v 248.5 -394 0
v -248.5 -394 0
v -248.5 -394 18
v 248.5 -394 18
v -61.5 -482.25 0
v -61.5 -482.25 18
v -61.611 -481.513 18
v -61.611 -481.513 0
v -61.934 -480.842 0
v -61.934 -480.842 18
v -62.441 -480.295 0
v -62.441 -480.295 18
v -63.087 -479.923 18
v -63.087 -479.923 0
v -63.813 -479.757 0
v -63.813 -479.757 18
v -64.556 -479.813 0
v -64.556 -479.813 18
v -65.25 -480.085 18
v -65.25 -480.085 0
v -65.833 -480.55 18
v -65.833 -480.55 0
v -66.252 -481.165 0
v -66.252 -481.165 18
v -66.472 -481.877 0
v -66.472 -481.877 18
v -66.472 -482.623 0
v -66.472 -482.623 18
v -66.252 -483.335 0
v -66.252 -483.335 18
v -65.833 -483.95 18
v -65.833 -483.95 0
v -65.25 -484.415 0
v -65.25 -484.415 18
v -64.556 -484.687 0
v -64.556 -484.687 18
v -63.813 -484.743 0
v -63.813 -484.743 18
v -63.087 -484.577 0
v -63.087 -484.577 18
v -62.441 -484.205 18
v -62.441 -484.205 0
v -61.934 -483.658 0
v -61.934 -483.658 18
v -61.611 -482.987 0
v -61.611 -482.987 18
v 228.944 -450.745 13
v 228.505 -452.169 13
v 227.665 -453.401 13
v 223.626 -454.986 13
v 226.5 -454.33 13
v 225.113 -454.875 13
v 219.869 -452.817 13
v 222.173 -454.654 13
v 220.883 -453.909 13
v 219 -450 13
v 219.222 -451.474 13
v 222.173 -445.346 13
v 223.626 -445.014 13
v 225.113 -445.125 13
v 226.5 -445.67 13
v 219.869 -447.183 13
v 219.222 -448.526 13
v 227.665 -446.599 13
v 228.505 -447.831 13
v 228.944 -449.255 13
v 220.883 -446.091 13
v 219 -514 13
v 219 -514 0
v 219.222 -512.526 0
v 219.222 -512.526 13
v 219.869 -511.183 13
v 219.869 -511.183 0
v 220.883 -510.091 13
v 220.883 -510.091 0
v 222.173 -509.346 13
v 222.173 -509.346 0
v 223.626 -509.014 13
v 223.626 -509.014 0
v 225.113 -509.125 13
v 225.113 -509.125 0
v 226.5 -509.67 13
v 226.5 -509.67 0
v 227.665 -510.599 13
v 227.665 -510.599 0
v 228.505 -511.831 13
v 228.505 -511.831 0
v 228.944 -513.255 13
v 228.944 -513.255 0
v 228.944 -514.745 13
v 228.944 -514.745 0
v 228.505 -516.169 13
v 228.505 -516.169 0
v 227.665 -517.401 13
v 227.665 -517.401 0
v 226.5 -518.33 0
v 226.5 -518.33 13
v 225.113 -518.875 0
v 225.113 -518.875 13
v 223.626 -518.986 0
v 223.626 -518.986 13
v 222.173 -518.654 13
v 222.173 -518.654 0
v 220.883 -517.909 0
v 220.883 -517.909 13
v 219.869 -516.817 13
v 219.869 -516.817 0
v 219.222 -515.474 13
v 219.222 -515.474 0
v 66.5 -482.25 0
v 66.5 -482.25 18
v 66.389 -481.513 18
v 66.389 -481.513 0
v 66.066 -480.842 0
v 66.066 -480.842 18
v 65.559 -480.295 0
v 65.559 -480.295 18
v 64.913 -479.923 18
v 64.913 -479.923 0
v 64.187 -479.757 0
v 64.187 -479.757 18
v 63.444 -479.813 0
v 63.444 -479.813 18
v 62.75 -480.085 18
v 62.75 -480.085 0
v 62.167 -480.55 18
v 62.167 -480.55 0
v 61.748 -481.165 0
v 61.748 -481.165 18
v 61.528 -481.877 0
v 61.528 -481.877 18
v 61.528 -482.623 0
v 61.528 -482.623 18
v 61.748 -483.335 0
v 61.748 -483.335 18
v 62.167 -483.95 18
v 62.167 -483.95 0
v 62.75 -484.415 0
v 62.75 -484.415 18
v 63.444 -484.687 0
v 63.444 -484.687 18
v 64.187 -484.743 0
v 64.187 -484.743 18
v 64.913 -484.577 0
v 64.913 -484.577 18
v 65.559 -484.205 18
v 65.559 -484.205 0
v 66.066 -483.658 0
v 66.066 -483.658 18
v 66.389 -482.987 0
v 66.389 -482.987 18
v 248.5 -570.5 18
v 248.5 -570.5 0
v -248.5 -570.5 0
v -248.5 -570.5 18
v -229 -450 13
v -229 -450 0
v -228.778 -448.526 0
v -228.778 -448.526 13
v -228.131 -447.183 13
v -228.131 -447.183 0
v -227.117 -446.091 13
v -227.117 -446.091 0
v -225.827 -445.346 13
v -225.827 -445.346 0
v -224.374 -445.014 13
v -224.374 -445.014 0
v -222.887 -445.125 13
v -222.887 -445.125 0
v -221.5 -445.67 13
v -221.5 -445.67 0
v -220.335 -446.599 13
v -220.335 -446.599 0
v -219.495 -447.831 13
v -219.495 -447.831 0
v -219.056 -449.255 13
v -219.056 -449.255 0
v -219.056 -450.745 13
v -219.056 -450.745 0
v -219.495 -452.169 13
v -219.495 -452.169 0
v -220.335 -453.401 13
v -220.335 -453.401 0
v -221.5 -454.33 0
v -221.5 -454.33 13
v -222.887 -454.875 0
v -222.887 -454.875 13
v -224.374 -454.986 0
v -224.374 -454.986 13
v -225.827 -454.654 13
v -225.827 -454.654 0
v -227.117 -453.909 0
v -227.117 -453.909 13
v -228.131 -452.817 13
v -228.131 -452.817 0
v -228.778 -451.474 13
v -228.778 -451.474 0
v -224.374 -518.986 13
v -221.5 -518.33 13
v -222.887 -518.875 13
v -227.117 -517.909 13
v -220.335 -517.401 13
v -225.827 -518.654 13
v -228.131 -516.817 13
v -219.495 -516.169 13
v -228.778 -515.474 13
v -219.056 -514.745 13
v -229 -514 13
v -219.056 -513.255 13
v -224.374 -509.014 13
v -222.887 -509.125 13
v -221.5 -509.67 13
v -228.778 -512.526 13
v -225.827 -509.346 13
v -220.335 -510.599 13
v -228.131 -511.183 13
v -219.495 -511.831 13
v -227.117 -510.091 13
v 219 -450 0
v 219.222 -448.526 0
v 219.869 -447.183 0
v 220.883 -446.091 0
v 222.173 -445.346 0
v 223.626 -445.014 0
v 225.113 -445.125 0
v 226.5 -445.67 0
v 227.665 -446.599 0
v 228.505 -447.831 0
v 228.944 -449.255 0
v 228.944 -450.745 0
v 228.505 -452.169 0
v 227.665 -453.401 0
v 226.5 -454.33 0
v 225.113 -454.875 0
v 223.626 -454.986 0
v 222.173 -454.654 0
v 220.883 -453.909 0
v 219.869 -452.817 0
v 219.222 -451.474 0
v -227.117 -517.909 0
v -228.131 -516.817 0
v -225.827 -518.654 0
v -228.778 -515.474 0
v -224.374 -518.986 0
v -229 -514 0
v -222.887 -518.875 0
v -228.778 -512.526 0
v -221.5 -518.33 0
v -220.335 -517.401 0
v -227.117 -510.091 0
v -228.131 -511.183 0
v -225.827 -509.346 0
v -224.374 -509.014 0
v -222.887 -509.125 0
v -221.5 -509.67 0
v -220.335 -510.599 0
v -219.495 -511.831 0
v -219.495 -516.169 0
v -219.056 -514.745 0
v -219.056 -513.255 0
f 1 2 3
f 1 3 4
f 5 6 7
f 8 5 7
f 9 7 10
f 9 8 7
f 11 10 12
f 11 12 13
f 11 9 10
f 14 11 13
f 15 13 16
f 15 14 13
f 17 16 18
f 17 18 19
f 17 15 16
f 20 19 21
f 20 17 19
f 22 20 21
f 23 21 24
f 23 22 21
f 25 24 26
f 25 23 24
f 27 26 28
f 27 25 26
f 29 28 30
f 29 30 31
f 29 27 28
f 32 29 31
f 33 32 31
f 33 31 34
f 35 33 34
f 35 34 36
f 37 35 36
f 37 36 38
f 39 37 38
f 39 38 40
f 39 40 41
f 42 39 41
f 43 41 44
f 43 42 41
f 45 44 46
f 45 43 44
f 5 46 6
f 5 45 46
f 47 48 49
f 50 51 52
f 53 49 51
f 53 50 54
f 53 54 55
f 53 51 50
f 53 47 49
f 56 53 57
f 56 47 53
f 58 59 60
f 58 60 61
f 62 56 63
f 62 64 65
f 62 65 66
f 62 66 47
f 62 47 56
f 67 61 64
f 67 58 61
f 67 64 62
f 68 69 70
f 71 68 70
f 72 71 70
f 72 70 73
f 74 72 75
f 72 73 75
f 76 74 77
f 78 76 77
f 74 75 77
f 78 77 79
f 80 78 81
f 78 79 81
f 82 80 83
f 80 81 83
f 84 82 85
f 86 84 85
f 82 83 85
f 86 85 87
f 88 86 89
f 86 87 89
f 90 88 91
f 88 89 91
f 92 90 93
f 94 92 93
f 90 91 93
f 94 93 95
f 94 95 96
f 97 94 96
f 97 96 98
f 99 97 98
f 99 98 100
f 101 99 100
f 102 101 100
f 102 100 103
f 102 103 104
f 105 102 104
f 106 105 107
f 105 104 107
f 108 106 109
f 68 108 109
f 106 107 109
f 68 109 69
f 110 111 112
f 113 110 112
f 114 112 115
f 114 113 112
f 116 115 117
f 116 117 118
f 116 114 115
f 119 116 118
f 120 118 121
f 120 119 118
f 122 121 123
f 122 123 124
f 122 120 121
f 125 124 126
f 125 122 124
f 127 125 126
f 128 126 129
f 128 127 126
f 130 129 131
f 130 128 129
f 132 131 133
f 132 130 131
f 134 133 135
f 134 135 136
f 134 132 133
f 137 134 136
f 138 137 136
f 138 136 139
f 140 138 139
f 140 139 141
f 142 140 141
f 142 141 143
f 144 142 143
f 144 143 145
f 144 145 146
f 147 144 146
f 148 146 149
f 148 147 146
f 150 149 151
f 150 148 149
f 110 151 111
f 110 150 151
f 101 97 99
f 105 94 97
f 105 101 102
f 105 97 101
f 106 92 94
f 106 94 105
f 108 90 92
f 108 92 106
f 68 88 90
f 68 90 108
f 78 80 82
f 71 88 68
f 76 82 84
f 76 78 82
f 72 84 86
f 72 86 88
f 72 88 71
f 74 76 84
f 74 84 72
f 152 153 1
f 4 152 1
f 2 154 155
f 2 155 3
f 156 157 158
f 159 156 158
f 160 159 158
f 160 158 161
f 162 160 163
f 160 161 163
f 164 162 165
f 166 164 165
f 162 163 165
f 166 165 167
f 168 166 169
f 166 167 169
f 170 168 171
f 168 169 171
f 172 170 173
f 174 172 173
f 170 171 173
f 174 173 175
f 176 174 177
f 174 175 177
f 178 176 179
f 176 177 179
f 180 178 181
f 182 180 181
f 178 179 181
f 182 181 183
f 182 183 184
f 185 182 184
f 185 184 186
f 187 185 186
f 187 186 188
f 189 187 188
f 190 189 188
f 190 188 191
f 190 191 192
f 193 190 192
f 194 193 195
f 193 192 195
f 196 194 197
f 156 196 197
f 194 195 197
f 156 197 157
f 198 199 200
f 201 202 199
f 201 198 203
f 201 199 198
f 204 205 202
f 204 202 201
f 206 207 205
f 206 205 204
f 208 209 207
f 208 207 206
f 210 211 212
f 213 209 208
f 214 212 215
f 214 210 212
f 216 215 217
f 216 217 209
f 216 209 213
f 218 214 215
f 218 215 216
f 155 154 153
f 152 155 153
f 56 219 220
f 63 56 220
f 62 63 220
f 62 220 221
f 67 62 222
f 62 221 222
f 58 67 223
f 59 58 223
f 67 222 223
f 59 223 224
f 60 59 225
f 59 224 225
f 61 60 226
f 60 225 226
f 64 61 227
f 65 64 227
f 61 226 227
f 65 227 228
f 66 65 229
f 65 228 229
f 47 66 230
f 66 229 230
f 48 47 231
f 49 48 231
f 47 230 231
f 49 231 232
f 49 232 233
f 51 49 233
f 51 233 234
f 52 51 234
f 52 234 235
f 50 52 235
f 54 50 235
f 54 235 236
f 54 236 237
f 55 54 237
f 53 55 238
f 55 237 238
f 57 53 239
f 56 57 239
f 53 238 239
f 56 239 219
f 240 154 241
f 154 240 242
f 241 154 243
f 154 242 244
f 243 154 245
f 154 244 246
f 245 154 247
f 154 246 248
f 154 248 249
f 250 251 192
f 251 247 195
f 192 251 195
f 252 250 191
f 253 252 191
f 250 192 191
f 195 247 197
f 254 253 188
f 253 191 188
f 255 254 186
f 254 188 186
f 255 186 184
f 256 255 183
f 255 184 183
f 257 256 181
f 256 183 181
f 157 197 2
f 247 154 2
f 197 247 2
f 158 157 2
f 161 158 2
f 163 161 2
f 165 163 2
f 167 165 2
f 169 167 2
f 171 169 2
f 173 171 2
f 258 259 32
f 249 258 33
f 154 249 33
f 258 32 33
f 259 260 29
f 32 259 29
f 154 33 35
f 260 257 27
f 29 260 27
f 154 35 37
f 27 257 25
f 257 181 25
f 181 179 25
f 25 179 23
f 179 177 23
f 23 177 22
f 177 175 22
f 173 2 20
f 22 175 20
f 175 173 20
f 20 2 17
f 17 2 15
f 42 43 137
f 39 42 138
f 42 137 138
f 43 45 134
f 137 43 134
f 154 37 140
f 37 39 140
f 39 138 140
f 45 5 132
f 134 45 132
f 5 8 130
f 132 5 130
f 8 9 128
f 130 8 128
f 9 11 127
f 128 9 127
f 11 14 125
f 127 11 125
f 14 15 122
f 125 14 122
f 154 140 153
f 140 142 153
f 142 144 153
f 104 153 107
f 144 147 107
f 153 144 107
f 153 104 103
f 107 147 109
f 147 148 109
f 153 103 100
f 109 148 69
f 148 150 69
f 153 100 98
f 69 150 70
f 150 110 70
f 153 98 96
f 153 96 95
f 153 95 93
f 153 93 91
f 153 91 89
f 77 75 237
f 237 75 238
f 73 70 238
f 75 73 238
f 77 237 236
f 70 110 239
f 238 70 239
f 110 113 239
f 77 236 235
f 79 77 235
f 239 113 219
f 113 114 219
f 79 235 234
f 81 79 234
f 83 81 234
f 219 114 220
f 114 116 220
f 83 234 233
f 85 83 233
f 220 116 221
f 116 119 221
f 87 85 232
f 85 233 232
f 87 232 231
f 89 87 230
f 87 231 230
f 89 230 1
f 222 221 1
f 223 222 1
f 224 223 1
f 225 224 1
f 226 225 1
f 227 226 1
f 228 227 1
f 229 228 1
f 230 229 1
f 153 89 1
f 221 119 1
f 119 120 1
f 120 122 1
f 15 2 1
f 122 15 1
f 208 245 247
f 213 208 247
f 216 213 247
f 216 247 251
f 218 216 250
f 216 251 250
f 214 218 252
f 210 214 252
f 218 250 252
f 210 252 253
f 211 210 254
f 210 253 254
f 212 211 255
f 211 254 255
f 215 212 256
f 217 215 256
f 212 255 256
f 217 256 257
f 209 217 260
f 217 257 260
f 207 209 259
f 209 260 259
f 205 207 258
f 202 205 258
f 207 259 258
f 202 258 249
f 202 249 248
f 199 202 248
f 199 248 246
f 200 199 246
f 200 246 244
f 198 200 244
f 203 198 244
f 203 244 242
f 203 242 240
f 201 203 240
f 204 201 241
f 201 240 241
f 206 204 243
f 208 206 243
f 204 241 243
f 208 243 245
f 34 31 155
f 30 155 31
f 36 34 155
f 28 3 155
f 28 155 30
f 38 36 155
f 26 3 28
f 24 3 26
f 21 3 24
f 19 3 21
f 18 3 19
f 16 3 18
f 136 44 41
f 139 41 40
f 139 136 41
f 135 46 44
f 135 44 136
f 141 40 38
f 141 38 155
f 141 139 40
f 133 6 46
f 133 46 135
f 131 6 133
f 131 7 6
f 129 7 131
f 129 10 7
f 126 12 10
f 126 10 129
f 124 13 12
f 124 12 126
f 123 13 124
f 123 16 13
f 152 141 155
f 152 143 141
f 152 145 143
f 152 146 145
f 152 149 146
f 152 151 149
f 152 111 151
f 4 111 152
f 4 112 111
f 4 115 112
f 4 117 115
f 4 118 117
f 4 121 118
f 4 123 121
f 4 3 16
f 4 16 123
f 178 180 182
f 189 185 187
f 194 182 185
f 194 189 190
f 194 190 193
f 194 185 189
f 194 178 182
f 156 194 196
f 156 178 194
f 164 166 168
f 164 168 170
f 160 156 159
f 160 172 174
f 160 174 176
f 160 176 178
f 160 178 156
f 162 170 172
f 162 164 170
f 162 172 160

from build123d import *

# Parameters (mm, degrees)
SKETCH1_W           = 497
SKETCH1_H           = 176.5
SKETCH1_R           = 2.5
BOSS_EXTRUDE1_DEPTH = 18
SKETCH2_R           = 5
CUT_EXTRUDE1_DEPTH  = 13


with BuildPart() as part:
    # Sketch1 → Boss-Extrude1 (new body)
    with BuildSketch(Plane.XY):
        with Locations((0, -482.25)):
            Rectangle(SKETCH1_W, SKETCH1_H)
        with Locations((64, -482.25)):
            Circle(SKETCH1_R, mode=Mode.SUBTRACT)
        with Locations((-64, -482.25)):
            Circle(SKETCH1_R, mode=Mode.SUBTRACT)
    extrude(amount=BOSS_EXTRUDE1_DEPTH)

    # Sketch2 → Cut-Extrude1 (cut)
    with BuildSketch(Plane(origin=(0, 0, 0), x_dir=(-1, 0, 0), z_dir=(0, 0, -1))):
        with Locations((224, -514)):
            Circle(SKETCH2_R)
        with Locations((-224, -514)):
            Circle(SKETCH2_R)
        with Locations((224, -450)):
            Circle(SKETCH2_R)
        with Locations((-224, -450)):
            Circle(SKETCH2_R)
    extrude(amount=-CUT_EXTRUDE1_DEPTH, mode=Mode.SUBTRACT)


solid = part.part
